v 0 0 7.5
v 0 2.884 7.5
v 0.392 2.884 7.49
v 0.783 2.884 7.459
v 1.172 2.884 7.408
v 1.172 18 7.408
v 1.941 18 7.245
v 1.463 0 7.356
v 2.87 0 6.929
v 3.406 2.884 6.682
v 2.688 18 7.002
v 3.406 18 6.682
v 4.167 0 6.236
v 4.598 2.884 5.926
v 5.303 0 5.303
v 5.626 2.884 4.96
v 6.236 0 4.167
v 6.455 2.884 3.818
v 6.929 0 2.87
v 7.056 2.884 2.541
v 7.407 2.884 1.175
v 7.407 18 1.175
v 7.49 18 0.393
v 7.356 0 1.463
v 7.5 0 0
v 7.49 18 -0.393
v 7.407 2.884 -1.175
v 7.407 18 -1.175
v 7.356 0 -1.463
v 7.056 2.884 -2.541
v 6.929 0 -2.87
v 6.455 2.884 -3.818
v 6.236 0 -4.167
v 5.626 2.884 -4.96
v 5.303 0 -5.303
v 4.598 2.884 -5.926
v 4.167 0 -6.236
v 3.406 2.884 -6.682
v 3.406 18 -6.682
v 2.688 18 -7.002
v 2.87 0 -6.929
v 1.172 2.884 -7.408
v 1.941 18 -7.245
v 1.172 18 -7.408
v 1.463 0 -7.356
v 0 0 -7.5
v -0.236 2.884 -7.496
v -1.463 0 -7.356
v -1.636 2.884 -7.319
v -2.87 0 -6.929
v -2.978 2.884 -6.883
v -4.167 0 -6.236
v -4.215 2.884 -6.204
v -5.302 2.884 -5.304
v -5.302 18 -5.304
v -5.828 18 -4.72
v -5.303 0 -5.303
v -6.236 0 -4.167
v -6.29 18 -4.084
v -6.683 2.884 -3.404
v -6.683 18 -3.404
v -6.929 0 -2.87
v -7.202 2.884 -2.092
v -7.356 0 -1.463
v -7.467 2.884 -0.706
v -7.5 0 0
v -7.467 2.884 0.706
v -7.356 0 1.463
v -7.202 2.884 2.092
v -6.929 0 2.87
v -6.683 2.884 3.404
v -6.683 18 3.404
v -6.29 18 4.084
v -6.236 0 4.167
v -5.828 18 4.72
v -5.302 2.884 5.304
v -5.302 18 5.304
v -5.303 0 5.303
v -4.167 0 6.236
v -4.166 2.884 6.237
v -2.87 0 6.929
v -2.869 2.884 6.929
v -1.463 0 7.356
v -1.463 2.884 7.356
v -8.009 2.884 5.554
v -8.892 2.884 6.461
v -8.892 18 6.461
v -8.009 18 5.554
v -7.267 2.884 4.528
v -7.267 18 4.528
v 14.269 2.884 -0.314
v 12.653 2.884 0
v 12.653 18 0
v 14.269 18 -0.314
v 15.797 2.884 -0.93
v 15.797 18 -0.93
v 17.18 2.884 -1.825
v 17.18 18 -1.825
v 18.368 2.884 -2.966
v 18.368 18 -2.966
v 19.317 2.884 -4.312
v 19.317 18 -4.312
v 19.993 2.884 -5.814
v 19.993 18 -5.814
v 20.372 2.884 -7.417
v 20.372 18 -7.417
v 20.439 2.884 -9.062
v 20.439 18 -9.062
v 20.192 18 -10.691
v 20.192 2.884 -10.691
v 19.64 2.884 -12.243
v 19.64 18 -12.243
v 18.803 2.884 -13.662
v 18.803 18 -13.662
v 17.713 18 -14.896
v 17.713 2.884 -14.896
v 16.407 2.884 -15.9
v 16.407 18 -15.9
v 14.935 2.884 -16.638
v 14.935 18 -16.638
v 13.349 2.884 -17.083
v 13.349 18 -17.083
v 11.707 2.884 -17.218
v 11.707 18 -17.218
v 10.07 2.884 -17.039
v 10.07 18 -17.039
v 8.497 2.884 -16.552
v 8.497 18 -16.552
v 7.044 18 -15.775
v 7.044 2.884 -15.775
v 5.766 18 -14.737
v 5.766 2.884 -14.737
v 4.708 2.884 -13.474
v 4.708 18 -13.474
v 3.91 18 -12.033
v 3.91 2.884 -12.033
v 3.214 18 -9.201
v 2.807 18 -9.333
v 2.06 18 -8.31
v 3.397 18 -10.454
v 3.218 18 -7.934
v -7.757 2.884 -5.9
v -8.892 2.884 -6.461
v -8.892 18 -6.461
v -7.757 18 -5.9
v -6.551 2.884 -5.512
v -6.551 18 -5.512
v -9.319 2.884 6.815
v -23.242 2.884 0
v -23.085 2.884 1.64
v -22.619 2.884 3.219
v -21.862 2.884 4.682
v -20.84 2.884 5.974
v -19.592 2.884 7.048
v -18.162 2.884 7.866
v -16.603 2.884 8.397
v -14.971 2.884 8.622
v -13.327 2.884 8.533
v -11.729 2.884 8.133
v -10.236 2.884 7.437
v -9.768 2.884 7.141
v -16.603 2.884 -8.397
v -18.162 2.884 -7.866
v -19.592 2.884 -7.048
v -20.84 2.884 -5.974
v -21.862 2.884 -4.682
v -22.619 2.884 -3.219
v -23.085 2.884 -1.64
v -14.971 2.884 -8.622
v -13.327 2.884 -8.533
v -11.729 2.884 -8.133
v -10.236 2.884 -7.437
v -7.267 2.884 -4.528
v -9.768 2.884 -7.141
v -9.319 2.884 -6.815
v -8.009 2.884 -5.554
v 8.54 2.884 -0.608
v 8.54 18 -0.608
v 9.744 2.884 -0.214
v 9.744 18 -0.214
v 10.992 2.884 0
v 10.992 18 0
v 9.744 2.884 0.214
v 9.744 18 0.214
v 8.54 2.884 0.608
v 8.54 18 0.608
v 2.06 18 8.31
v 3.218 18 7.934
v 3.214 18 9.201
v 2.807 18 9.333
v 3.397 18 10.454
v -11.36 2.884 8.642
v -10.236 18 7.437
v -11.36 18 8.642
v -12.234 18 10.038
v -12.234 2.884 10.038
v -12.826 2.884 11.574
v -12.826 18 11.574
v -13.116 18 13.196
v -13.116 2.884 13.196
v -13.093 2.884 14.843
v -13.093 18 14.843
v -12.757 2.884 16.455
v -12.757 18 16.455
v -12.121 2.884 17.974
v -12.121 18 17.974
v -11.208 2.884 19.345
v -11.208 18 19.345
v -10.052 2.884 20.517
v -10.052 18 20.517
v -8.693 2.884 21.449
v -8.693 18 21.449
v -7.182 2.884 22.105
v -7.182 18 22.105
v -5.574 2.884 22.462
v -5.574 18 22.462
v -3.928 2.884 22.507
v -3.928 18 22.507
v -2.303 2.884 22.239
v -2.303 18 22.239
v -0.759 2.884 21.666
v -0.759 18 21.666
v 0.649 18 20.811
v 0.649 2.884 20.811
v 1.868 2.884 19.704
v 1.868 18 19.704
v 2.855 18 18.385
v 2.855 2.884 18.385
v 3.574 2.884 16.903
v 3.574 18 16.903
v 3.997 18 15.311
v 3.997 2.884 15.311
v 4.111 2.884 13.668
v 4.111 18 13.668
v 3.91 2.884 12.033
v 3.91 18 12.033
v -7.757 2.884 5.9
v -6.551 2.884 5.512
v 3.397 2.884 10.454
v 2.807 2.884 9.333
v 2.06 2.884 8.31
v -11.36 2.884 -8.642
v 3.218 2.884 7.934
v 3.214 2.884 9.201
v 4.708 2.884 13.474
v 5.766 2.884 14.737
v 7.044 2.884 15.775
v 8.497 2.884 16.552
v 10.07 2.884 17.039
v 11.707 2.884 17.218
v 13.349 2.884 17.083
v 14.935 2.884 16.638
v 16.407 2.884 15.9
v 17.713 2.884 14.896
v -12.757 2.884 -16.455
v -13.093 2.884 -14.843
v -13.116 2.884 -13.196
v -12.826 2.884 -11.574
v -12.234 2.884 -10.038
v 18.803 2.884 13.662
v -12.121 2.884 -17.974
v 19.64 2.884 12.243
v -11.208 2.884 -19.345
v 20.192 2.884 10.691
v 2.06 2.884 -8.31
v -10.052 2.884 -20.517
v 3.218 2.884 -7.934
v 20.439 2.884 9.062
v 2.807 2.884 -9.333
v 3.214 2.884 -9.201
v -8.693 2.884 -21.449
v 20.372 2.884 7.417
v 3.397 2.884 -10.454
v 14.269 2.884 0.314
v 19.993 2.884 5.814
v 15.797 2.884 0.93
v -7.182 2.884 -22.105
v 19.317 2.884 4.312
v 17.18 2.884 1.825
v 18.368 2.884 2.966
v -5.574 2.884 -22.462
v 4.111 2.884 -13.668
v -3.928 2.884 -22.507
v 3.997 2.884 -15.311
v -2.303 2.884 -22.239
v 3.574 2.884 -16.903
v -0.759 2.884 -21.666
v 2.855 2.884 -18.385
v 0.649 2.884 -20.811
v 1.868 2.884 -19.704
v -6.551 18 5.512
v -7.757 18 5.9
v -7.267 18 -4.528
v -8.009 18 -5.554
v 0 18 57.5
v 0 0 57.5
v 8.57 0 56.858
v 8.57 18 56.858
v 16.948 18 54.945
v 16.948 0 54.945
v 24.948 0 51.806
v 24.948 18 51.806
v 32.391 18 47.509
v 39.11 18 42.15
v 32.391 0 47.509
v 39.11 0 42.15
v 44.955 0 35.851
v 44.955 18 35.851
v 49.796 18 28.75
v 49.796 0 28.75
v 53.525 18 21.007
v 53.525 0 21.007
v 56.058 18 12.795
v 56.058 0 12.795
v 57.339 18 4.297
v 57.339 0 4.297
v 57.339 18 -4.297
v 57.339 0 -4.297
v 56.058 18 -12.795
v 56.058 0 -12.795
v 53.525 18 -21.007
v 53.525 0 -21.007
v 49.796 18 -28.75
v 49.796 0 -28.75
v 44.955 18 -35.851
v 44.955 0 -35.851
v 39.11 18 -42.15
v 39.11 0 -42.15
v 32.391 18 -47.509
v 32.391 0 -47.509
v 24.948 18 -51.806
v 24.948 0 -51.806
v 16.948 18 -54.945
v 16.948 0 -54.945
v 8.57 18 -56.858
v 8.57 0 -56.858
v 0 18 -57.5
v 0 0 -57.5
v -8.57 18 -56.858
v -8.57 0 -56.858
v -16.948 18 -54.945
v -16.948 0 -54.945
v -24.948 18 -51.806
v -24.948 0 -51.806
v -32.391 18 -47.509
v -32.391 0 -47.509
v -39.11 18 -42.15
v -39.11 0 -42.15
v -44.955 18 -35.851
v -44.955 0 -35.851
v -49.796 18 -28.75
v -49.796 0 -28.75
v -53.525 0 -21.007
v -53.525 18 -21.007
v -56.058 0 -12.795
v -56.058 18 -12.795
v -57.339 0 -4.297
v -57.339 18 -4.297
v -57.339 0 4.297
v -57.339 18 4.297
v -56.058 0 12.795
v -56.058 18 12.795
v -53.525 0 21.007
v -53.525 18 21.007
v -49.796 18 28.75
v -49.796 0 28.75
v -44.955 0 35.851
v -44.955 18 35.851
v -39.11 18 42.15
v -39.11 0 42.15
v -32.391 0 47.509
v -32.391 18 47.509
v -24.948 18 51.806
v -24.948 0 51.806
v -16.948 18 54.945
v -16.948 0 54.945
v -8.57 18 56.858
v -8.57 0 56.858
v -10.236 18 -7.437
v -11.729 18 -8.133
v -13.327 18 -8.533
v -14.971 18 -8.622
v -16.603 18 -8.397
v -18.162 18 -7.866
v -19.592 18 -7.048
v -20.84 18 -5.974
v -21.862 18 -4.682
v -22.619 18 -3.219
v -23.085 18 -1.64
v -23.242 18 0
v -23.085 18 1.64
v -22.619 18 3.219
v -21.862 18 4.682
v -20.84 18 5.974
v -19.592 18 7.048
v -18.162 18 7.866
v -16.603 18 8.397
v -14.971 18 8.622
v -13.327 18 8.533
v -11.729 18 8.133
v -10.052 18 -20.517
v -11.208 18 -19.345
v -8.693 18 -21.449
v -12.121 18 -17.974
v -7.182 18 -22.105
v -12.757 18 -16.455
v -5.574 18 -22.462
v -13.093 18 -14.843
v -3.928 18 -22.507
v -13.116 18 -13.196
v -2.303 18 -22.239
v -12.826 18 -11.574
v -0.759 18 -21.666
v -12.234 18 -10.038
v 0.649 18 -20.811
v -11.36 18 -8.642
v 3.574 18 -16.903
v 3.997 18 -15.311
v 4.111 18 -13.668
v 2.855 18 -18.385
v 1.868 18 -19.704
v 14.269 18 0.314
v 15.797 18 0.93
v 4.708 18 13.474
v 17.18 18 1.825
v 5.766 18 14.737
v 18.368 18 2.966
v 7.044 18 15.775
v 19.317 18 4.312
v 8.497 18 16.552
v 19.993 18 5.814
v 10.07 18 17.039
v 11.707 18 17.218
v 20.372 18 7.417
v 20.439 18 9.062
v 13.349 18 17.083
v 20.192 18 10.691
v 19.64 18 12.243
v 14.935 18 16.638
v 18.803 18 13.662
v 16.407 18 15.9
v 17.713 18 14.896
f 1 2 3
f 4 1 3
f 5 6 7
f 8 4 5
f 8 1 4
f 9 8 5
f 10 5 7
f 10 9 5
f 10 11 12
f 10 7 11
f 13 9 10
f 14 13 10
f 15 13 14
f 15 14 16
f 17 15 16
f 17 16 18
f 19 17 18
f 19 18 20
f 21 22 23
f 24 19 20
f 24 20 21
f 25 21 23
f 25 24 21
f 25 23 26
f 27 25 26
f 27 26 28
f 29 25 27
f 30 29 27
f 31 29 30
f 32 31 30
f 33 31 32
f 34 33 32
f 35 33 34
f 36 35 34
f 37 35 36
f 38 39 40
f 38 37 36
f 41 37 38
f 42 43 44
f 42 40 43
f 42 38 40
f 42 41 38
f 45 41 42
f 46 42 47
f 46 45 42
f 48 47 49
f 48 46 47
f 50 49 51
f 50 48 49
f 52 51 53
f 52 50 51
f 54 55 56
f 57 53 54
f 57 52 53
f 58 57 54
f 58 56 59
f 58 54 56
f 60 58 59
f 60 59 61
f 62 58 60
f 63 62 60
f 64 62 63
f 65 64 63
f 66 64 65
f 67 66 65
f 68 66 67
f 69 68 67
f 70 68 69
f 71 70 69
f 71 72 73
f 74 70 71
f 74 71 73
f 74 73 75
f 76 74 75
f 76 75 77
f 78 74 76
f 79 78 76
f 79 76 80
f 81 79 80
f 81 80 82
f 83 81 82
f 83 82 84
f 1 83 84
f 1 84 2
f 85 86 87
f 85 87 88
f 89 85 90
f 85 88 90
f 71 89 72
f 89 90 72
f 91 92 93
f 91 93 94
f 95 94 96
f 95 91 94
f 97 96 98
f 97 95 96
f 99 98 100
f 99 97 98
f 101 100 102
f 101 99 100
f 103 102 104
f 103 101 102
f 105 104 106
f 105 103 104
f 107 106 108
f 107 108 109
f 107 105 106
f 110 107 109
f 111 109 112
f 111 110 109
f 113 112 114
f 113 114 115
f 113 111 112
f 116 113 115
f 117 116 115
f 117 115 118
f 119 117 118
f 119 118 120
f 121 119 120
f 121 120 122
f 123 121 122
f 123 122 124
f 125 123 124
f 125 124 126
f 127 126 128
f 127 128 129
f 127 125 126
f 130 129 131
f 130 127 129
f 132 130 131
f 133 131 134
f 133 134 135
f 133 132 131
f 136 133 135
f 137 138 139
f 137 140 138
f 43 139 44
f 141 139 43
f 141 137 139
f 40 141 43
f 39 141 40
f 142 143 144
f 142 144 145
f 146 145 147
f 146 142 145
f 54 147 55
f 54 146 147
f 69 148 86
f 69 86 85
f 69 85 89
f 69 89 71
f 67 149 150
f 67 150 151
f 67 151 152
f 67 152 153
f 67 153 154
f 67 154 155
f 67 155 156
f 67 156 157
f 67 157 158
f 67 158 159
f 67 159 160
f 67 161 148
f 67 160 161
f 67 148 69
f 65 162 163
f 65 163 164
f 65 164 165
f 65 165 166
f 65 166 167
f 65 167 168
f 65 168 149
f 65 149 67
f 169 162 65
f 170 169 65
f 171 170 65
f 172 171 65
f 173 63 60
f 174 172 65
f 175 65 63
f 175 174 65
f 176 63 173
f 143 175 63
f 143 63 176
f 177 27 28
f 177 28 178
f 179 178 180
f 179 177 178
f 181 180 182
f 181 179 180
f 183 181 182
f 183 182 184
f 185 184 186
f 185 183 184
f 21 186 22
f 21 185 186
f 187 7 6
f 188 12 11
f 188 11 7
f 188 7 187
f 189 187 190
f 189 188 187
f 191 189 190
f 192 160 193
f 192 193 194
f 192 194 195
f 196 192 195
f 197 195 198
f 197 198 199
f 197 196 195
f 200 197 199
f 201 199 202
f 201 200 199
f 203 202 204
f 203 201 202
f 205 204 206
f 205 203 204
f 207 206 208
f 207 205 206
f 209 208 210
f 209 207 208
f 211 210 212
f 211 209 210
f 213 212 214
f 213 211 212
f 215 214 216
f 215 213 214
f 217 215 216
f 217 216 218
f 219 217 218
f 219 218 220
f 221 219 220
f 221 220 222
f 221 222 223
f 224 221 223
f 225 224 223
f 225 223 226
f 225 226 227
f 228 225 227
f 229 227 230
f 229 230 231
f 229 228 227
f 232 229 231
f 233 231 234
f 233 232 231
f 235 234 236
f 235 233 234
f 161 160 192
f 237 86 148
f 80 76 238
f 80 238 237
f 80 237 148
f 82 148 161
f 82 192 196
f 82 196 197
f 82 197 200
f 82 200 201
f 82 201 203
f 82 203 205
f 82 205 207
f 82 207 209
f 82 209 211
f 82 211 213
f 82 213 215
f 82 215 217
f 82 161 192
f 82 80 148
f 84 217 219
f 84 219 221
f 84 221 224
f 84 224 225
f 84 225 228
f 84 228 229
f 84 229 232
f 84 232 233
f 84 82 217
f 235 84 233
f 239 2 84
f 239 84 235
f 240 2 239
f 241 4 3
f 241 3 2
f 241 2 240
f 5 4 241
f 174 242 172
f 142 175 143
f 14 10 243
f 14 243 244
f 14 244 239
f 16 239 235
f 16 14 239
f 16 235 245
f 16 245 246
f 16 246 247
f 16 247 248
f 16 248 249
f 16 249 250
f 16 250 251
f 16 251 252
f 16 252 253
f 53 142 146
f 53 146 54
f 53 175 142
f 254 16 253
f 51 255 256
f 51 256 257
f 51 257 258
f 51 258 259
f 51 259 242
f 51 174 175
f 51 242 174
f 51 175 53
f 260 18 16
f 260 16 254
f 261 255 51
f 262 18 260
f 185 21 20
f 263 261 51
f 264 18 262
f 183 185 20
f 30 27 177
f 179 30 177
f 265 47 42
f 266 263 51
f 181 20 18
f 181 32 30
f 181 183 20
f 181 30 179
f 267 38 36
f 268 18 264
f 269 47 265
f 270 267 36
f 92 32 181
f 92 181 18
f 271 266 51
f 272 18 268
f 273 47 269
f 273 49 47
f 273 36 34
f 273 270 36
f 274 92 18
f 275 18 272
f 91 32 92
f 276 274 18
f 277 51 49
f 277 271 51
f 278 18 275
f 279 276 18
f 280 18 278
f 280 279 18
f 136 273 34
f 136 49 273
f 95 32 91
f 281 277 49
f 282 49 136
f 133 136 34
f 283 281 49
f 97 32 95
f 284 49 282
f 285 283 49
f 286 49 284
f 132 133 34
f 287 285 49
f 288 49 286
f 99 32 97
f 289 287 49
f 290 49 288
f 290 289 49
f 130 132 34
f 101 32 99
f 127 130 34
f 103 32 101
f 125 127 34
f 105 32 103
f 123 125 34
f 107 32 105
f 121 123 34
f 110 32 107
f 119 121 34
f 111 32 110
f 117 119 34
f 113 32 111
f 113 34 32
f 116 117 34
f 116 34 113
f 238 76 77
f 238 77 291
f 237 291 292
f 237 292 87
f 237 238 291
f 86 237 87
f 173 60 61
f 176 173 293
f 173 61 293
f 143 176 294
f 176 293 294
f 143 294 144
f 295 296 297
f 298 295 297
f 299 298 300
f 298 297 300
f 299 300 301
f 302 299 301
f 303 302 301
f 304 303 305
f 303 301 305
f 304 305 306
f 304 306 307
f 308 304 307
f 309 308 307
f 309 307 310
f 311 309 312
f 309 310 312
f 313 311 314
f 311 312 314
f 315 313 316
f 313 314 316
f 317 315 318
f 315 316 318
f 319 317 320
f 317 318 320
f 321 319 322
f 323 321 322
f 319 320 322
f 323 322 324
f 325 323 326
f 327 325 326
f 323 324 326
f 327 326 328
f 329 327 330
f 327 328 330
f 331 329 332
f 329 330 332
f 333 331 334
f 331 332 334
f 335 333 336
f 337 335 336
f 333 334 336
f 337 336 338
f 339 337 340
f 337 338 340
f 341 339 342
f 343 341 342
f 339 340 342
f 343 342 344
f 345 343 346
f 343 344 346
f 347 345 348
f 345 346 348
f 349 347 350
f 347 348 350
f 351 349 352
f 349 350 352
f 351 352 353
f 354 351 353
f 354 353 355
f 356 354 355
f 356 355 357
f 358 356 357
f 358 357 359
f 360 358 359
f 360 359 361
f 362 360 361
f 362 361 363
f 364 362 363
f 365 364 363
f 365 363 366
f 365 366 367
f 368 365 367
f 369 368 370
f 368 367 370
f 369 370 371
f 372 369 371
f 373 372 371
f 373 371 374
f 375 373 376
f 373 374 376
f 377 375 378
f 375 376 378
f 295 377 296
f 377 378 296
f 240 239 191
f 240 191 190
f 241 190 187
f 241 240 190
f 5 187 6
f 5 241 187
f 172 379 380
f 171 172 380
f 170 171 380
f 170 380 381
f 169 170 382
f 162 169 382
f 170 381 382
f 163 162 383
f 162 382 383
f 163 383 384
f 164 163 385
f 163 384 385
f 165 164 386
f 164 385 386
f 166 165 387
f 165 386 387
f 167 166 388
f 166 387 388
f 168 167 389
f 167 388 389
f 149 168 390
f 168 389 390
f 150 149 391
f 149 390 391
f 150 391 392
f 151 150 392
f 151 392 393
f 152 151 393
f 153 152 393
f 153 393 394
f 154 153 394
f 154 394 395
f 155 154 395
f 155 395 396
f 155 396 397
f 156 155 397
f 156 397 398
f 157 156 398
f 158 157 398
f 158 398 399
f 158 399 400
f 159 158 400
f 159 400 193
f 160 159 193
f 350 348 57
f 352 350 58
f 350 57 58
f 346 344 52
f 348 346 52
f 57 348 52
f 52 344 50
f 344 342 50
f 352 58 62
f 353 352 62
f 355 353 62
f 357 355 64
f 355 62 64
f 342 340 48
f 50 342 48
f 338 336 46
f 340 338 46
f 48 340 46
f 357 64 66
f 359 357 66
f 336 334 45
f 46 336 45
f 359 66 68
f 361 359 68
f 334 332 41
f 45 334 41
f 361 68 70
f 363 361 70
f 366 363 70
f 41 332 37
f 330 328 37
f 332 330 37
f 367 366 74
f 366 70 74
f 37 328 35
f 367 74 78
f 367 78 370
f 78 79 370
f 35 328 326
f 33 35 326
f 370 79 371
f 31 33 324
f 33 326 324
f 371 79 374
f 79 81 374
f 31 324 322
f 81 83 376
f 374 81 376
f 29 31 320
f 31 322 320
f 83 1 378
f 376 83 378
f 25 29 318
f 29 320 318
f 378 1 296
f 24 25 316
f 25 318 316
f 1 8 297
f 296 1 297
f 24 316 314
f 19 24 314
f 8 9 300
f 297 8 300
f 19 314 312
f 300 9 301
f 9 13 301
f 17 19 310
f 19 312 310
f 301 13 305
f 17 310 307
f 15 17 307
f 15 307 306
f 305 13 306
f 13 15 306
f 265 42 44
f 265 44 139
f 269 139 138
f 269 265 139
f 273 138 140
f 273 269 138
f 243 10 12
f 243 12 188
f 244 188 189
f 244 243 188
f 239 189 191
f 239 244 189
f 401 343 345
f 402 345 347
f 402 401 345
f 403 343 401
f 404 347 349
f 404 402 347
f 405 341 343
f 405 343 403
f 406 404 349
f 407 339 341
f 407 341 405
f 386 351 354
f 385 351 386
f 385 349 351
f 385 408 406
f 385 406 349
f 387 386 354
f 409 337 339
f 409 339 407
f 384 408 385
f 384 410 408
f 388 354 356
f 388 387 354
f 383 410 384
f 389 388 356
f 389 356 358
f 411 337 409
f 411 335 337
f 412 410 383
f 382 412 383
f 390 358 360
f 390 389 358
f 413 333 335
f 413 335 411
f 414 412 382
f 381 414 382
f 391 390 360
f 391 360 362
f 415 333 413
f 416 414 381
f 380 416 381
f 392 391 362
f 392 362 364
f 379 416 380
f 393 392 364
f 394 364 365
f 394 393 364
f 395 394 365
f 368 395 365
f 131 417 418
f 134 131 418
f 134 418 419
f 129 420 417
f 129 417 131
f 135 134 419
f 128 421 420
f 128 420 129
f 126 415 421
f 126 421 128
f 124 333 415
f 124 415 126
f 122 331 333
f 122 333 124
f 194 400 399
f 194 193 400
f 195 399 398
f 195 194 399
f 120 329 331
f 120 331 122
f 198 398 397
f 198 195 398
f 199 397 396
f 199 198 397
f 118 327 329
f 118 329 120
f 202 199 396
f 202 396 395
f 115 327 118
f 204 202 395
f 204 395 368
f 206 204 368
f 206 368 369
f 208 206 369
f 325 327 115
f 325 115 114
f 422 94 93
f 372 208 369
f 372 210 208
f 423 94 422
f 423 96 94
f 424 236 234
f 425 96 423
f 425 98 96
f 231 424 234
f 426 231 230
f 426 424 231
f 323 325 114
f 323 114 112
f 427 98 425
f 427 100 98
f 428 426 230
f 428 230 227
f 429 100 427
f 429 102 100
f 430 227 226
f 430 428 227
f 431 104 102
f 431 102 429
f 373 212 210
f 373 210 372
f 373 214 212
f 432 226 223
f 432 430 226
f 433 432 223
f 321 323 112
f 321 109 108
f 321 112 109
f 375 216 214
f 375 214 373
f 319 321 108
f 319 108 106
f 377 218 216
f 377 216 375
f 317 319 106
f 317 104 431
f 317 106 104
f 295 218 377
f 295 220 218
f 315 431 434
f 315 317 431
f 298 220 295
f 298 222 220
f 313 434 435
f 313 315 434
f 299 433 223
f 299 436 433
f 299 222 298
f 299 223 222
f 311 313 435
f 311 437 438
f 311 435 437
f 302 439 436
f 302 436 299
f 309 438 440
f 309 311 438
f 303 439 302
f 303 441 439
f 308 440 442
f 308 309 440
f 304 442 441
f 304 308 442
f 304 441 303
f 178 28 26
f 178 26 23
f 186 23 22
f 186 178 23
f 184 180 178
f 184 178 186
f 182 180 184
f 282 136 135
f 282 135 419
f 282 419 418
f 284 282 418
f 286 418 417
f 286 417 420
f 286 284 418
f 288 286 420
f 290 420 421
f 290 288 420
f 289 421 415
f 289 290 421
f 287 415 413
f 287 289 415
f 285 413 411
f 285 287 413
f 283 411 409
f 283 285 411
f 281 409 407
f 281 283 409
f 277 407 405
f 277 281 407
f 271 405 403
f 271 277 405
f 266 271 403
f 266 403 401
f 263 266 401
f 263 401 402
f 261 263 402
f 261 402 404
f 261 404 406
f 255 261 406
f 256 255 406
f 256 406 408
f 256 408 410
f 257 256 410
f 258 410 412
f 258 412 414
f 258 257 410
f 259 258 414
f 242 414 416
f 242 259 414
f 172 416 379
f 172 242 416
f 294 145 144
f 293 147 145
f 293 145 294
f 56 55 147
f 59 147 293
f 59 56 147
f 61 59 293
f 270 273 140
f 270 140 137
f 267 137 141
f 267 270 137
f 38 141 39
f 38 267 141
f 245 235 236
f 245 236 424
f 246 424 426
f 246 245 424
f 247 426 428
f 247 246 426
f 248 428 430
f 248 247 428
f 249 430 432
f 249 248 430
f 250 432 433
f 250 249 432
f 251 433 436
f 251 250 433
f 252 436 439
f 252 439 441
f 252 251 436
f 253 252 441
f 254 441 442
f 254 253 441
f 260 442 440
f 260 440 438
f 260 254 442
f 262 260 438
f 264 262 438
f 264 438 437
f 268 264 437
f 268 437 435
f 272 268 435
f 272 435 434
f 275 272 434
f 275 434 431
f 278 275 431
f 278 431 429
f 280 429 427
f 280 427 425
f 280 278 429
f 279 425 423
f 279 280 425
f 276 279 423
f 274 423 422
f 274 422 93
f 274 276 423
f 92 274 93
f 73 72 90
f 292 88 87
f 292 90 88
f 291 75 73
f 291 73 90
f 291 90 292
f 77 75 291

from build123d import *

# Parameters (mm, degrees)
SKETCH1_R           = 57.5
BOSS_EXTRUDE1_DEPTH = 18
SKETCH2_R           = 7.5
CUT_EXTRUDE1_DEPTH  = 84.285653026
SKETCH3_R           = 8.629374231
CUT_EXTRUDE2_DEPTH  = 15.116019146
CIRPATTERN1_COUNT   = 5


with BuildPart() as part:
    # Sketch1 → Boss-Extrude1 (new body)
    with BuildSketch(Plane(origin=(0, 0, 0), x_dir=(1, 0, 0), z_dir=(0, 1, 0))):
        Circle(SKETCH1_R)
    extrude(amount=BOSS_EXTRUDE1_DEPTH)

    # Sketch2 → Cut-Extrude1 (cut, through all)
    with BuildSketch(Plane(origin=(0, 0, 0), x_dir=(1, 0, 0), z_dir=(0, 1, 0))):
        Circle(SKETCH2_R)
    extrude(amount=CUT_EXTRUDE1_DEPTH, mode=Mode.SUBTRACT)

    # Sketch3 → Cut-Extrude2 (cut)
    with BuildSketch(Plane(origin=(0, 18, 0), x_dir=(1, 0, 0), z_dir=(0, 1, 0))):
        with Locations((-14.613023748, 0)):
            Circle(SKETCH3_R)
    cut_extrude2 = extrude(amount=-CUT_EXTRUDE2_DEPTH, mode=Mode.SUBTRACT)

    # CirPattern1: Cut-Extrude2 ×5 about axis
    cirpattern1_axis = Axis((0, 0, 0), (0, 1, 0))
    for i in range(1, CIRPATTERN1_COUNT):
        add(cut_extrude2.rotate(cirpattern1_axis, i * 360 / CIRPATTERN1_COUNT), mode=Mode.SUBTRACT)


solid = part.part
